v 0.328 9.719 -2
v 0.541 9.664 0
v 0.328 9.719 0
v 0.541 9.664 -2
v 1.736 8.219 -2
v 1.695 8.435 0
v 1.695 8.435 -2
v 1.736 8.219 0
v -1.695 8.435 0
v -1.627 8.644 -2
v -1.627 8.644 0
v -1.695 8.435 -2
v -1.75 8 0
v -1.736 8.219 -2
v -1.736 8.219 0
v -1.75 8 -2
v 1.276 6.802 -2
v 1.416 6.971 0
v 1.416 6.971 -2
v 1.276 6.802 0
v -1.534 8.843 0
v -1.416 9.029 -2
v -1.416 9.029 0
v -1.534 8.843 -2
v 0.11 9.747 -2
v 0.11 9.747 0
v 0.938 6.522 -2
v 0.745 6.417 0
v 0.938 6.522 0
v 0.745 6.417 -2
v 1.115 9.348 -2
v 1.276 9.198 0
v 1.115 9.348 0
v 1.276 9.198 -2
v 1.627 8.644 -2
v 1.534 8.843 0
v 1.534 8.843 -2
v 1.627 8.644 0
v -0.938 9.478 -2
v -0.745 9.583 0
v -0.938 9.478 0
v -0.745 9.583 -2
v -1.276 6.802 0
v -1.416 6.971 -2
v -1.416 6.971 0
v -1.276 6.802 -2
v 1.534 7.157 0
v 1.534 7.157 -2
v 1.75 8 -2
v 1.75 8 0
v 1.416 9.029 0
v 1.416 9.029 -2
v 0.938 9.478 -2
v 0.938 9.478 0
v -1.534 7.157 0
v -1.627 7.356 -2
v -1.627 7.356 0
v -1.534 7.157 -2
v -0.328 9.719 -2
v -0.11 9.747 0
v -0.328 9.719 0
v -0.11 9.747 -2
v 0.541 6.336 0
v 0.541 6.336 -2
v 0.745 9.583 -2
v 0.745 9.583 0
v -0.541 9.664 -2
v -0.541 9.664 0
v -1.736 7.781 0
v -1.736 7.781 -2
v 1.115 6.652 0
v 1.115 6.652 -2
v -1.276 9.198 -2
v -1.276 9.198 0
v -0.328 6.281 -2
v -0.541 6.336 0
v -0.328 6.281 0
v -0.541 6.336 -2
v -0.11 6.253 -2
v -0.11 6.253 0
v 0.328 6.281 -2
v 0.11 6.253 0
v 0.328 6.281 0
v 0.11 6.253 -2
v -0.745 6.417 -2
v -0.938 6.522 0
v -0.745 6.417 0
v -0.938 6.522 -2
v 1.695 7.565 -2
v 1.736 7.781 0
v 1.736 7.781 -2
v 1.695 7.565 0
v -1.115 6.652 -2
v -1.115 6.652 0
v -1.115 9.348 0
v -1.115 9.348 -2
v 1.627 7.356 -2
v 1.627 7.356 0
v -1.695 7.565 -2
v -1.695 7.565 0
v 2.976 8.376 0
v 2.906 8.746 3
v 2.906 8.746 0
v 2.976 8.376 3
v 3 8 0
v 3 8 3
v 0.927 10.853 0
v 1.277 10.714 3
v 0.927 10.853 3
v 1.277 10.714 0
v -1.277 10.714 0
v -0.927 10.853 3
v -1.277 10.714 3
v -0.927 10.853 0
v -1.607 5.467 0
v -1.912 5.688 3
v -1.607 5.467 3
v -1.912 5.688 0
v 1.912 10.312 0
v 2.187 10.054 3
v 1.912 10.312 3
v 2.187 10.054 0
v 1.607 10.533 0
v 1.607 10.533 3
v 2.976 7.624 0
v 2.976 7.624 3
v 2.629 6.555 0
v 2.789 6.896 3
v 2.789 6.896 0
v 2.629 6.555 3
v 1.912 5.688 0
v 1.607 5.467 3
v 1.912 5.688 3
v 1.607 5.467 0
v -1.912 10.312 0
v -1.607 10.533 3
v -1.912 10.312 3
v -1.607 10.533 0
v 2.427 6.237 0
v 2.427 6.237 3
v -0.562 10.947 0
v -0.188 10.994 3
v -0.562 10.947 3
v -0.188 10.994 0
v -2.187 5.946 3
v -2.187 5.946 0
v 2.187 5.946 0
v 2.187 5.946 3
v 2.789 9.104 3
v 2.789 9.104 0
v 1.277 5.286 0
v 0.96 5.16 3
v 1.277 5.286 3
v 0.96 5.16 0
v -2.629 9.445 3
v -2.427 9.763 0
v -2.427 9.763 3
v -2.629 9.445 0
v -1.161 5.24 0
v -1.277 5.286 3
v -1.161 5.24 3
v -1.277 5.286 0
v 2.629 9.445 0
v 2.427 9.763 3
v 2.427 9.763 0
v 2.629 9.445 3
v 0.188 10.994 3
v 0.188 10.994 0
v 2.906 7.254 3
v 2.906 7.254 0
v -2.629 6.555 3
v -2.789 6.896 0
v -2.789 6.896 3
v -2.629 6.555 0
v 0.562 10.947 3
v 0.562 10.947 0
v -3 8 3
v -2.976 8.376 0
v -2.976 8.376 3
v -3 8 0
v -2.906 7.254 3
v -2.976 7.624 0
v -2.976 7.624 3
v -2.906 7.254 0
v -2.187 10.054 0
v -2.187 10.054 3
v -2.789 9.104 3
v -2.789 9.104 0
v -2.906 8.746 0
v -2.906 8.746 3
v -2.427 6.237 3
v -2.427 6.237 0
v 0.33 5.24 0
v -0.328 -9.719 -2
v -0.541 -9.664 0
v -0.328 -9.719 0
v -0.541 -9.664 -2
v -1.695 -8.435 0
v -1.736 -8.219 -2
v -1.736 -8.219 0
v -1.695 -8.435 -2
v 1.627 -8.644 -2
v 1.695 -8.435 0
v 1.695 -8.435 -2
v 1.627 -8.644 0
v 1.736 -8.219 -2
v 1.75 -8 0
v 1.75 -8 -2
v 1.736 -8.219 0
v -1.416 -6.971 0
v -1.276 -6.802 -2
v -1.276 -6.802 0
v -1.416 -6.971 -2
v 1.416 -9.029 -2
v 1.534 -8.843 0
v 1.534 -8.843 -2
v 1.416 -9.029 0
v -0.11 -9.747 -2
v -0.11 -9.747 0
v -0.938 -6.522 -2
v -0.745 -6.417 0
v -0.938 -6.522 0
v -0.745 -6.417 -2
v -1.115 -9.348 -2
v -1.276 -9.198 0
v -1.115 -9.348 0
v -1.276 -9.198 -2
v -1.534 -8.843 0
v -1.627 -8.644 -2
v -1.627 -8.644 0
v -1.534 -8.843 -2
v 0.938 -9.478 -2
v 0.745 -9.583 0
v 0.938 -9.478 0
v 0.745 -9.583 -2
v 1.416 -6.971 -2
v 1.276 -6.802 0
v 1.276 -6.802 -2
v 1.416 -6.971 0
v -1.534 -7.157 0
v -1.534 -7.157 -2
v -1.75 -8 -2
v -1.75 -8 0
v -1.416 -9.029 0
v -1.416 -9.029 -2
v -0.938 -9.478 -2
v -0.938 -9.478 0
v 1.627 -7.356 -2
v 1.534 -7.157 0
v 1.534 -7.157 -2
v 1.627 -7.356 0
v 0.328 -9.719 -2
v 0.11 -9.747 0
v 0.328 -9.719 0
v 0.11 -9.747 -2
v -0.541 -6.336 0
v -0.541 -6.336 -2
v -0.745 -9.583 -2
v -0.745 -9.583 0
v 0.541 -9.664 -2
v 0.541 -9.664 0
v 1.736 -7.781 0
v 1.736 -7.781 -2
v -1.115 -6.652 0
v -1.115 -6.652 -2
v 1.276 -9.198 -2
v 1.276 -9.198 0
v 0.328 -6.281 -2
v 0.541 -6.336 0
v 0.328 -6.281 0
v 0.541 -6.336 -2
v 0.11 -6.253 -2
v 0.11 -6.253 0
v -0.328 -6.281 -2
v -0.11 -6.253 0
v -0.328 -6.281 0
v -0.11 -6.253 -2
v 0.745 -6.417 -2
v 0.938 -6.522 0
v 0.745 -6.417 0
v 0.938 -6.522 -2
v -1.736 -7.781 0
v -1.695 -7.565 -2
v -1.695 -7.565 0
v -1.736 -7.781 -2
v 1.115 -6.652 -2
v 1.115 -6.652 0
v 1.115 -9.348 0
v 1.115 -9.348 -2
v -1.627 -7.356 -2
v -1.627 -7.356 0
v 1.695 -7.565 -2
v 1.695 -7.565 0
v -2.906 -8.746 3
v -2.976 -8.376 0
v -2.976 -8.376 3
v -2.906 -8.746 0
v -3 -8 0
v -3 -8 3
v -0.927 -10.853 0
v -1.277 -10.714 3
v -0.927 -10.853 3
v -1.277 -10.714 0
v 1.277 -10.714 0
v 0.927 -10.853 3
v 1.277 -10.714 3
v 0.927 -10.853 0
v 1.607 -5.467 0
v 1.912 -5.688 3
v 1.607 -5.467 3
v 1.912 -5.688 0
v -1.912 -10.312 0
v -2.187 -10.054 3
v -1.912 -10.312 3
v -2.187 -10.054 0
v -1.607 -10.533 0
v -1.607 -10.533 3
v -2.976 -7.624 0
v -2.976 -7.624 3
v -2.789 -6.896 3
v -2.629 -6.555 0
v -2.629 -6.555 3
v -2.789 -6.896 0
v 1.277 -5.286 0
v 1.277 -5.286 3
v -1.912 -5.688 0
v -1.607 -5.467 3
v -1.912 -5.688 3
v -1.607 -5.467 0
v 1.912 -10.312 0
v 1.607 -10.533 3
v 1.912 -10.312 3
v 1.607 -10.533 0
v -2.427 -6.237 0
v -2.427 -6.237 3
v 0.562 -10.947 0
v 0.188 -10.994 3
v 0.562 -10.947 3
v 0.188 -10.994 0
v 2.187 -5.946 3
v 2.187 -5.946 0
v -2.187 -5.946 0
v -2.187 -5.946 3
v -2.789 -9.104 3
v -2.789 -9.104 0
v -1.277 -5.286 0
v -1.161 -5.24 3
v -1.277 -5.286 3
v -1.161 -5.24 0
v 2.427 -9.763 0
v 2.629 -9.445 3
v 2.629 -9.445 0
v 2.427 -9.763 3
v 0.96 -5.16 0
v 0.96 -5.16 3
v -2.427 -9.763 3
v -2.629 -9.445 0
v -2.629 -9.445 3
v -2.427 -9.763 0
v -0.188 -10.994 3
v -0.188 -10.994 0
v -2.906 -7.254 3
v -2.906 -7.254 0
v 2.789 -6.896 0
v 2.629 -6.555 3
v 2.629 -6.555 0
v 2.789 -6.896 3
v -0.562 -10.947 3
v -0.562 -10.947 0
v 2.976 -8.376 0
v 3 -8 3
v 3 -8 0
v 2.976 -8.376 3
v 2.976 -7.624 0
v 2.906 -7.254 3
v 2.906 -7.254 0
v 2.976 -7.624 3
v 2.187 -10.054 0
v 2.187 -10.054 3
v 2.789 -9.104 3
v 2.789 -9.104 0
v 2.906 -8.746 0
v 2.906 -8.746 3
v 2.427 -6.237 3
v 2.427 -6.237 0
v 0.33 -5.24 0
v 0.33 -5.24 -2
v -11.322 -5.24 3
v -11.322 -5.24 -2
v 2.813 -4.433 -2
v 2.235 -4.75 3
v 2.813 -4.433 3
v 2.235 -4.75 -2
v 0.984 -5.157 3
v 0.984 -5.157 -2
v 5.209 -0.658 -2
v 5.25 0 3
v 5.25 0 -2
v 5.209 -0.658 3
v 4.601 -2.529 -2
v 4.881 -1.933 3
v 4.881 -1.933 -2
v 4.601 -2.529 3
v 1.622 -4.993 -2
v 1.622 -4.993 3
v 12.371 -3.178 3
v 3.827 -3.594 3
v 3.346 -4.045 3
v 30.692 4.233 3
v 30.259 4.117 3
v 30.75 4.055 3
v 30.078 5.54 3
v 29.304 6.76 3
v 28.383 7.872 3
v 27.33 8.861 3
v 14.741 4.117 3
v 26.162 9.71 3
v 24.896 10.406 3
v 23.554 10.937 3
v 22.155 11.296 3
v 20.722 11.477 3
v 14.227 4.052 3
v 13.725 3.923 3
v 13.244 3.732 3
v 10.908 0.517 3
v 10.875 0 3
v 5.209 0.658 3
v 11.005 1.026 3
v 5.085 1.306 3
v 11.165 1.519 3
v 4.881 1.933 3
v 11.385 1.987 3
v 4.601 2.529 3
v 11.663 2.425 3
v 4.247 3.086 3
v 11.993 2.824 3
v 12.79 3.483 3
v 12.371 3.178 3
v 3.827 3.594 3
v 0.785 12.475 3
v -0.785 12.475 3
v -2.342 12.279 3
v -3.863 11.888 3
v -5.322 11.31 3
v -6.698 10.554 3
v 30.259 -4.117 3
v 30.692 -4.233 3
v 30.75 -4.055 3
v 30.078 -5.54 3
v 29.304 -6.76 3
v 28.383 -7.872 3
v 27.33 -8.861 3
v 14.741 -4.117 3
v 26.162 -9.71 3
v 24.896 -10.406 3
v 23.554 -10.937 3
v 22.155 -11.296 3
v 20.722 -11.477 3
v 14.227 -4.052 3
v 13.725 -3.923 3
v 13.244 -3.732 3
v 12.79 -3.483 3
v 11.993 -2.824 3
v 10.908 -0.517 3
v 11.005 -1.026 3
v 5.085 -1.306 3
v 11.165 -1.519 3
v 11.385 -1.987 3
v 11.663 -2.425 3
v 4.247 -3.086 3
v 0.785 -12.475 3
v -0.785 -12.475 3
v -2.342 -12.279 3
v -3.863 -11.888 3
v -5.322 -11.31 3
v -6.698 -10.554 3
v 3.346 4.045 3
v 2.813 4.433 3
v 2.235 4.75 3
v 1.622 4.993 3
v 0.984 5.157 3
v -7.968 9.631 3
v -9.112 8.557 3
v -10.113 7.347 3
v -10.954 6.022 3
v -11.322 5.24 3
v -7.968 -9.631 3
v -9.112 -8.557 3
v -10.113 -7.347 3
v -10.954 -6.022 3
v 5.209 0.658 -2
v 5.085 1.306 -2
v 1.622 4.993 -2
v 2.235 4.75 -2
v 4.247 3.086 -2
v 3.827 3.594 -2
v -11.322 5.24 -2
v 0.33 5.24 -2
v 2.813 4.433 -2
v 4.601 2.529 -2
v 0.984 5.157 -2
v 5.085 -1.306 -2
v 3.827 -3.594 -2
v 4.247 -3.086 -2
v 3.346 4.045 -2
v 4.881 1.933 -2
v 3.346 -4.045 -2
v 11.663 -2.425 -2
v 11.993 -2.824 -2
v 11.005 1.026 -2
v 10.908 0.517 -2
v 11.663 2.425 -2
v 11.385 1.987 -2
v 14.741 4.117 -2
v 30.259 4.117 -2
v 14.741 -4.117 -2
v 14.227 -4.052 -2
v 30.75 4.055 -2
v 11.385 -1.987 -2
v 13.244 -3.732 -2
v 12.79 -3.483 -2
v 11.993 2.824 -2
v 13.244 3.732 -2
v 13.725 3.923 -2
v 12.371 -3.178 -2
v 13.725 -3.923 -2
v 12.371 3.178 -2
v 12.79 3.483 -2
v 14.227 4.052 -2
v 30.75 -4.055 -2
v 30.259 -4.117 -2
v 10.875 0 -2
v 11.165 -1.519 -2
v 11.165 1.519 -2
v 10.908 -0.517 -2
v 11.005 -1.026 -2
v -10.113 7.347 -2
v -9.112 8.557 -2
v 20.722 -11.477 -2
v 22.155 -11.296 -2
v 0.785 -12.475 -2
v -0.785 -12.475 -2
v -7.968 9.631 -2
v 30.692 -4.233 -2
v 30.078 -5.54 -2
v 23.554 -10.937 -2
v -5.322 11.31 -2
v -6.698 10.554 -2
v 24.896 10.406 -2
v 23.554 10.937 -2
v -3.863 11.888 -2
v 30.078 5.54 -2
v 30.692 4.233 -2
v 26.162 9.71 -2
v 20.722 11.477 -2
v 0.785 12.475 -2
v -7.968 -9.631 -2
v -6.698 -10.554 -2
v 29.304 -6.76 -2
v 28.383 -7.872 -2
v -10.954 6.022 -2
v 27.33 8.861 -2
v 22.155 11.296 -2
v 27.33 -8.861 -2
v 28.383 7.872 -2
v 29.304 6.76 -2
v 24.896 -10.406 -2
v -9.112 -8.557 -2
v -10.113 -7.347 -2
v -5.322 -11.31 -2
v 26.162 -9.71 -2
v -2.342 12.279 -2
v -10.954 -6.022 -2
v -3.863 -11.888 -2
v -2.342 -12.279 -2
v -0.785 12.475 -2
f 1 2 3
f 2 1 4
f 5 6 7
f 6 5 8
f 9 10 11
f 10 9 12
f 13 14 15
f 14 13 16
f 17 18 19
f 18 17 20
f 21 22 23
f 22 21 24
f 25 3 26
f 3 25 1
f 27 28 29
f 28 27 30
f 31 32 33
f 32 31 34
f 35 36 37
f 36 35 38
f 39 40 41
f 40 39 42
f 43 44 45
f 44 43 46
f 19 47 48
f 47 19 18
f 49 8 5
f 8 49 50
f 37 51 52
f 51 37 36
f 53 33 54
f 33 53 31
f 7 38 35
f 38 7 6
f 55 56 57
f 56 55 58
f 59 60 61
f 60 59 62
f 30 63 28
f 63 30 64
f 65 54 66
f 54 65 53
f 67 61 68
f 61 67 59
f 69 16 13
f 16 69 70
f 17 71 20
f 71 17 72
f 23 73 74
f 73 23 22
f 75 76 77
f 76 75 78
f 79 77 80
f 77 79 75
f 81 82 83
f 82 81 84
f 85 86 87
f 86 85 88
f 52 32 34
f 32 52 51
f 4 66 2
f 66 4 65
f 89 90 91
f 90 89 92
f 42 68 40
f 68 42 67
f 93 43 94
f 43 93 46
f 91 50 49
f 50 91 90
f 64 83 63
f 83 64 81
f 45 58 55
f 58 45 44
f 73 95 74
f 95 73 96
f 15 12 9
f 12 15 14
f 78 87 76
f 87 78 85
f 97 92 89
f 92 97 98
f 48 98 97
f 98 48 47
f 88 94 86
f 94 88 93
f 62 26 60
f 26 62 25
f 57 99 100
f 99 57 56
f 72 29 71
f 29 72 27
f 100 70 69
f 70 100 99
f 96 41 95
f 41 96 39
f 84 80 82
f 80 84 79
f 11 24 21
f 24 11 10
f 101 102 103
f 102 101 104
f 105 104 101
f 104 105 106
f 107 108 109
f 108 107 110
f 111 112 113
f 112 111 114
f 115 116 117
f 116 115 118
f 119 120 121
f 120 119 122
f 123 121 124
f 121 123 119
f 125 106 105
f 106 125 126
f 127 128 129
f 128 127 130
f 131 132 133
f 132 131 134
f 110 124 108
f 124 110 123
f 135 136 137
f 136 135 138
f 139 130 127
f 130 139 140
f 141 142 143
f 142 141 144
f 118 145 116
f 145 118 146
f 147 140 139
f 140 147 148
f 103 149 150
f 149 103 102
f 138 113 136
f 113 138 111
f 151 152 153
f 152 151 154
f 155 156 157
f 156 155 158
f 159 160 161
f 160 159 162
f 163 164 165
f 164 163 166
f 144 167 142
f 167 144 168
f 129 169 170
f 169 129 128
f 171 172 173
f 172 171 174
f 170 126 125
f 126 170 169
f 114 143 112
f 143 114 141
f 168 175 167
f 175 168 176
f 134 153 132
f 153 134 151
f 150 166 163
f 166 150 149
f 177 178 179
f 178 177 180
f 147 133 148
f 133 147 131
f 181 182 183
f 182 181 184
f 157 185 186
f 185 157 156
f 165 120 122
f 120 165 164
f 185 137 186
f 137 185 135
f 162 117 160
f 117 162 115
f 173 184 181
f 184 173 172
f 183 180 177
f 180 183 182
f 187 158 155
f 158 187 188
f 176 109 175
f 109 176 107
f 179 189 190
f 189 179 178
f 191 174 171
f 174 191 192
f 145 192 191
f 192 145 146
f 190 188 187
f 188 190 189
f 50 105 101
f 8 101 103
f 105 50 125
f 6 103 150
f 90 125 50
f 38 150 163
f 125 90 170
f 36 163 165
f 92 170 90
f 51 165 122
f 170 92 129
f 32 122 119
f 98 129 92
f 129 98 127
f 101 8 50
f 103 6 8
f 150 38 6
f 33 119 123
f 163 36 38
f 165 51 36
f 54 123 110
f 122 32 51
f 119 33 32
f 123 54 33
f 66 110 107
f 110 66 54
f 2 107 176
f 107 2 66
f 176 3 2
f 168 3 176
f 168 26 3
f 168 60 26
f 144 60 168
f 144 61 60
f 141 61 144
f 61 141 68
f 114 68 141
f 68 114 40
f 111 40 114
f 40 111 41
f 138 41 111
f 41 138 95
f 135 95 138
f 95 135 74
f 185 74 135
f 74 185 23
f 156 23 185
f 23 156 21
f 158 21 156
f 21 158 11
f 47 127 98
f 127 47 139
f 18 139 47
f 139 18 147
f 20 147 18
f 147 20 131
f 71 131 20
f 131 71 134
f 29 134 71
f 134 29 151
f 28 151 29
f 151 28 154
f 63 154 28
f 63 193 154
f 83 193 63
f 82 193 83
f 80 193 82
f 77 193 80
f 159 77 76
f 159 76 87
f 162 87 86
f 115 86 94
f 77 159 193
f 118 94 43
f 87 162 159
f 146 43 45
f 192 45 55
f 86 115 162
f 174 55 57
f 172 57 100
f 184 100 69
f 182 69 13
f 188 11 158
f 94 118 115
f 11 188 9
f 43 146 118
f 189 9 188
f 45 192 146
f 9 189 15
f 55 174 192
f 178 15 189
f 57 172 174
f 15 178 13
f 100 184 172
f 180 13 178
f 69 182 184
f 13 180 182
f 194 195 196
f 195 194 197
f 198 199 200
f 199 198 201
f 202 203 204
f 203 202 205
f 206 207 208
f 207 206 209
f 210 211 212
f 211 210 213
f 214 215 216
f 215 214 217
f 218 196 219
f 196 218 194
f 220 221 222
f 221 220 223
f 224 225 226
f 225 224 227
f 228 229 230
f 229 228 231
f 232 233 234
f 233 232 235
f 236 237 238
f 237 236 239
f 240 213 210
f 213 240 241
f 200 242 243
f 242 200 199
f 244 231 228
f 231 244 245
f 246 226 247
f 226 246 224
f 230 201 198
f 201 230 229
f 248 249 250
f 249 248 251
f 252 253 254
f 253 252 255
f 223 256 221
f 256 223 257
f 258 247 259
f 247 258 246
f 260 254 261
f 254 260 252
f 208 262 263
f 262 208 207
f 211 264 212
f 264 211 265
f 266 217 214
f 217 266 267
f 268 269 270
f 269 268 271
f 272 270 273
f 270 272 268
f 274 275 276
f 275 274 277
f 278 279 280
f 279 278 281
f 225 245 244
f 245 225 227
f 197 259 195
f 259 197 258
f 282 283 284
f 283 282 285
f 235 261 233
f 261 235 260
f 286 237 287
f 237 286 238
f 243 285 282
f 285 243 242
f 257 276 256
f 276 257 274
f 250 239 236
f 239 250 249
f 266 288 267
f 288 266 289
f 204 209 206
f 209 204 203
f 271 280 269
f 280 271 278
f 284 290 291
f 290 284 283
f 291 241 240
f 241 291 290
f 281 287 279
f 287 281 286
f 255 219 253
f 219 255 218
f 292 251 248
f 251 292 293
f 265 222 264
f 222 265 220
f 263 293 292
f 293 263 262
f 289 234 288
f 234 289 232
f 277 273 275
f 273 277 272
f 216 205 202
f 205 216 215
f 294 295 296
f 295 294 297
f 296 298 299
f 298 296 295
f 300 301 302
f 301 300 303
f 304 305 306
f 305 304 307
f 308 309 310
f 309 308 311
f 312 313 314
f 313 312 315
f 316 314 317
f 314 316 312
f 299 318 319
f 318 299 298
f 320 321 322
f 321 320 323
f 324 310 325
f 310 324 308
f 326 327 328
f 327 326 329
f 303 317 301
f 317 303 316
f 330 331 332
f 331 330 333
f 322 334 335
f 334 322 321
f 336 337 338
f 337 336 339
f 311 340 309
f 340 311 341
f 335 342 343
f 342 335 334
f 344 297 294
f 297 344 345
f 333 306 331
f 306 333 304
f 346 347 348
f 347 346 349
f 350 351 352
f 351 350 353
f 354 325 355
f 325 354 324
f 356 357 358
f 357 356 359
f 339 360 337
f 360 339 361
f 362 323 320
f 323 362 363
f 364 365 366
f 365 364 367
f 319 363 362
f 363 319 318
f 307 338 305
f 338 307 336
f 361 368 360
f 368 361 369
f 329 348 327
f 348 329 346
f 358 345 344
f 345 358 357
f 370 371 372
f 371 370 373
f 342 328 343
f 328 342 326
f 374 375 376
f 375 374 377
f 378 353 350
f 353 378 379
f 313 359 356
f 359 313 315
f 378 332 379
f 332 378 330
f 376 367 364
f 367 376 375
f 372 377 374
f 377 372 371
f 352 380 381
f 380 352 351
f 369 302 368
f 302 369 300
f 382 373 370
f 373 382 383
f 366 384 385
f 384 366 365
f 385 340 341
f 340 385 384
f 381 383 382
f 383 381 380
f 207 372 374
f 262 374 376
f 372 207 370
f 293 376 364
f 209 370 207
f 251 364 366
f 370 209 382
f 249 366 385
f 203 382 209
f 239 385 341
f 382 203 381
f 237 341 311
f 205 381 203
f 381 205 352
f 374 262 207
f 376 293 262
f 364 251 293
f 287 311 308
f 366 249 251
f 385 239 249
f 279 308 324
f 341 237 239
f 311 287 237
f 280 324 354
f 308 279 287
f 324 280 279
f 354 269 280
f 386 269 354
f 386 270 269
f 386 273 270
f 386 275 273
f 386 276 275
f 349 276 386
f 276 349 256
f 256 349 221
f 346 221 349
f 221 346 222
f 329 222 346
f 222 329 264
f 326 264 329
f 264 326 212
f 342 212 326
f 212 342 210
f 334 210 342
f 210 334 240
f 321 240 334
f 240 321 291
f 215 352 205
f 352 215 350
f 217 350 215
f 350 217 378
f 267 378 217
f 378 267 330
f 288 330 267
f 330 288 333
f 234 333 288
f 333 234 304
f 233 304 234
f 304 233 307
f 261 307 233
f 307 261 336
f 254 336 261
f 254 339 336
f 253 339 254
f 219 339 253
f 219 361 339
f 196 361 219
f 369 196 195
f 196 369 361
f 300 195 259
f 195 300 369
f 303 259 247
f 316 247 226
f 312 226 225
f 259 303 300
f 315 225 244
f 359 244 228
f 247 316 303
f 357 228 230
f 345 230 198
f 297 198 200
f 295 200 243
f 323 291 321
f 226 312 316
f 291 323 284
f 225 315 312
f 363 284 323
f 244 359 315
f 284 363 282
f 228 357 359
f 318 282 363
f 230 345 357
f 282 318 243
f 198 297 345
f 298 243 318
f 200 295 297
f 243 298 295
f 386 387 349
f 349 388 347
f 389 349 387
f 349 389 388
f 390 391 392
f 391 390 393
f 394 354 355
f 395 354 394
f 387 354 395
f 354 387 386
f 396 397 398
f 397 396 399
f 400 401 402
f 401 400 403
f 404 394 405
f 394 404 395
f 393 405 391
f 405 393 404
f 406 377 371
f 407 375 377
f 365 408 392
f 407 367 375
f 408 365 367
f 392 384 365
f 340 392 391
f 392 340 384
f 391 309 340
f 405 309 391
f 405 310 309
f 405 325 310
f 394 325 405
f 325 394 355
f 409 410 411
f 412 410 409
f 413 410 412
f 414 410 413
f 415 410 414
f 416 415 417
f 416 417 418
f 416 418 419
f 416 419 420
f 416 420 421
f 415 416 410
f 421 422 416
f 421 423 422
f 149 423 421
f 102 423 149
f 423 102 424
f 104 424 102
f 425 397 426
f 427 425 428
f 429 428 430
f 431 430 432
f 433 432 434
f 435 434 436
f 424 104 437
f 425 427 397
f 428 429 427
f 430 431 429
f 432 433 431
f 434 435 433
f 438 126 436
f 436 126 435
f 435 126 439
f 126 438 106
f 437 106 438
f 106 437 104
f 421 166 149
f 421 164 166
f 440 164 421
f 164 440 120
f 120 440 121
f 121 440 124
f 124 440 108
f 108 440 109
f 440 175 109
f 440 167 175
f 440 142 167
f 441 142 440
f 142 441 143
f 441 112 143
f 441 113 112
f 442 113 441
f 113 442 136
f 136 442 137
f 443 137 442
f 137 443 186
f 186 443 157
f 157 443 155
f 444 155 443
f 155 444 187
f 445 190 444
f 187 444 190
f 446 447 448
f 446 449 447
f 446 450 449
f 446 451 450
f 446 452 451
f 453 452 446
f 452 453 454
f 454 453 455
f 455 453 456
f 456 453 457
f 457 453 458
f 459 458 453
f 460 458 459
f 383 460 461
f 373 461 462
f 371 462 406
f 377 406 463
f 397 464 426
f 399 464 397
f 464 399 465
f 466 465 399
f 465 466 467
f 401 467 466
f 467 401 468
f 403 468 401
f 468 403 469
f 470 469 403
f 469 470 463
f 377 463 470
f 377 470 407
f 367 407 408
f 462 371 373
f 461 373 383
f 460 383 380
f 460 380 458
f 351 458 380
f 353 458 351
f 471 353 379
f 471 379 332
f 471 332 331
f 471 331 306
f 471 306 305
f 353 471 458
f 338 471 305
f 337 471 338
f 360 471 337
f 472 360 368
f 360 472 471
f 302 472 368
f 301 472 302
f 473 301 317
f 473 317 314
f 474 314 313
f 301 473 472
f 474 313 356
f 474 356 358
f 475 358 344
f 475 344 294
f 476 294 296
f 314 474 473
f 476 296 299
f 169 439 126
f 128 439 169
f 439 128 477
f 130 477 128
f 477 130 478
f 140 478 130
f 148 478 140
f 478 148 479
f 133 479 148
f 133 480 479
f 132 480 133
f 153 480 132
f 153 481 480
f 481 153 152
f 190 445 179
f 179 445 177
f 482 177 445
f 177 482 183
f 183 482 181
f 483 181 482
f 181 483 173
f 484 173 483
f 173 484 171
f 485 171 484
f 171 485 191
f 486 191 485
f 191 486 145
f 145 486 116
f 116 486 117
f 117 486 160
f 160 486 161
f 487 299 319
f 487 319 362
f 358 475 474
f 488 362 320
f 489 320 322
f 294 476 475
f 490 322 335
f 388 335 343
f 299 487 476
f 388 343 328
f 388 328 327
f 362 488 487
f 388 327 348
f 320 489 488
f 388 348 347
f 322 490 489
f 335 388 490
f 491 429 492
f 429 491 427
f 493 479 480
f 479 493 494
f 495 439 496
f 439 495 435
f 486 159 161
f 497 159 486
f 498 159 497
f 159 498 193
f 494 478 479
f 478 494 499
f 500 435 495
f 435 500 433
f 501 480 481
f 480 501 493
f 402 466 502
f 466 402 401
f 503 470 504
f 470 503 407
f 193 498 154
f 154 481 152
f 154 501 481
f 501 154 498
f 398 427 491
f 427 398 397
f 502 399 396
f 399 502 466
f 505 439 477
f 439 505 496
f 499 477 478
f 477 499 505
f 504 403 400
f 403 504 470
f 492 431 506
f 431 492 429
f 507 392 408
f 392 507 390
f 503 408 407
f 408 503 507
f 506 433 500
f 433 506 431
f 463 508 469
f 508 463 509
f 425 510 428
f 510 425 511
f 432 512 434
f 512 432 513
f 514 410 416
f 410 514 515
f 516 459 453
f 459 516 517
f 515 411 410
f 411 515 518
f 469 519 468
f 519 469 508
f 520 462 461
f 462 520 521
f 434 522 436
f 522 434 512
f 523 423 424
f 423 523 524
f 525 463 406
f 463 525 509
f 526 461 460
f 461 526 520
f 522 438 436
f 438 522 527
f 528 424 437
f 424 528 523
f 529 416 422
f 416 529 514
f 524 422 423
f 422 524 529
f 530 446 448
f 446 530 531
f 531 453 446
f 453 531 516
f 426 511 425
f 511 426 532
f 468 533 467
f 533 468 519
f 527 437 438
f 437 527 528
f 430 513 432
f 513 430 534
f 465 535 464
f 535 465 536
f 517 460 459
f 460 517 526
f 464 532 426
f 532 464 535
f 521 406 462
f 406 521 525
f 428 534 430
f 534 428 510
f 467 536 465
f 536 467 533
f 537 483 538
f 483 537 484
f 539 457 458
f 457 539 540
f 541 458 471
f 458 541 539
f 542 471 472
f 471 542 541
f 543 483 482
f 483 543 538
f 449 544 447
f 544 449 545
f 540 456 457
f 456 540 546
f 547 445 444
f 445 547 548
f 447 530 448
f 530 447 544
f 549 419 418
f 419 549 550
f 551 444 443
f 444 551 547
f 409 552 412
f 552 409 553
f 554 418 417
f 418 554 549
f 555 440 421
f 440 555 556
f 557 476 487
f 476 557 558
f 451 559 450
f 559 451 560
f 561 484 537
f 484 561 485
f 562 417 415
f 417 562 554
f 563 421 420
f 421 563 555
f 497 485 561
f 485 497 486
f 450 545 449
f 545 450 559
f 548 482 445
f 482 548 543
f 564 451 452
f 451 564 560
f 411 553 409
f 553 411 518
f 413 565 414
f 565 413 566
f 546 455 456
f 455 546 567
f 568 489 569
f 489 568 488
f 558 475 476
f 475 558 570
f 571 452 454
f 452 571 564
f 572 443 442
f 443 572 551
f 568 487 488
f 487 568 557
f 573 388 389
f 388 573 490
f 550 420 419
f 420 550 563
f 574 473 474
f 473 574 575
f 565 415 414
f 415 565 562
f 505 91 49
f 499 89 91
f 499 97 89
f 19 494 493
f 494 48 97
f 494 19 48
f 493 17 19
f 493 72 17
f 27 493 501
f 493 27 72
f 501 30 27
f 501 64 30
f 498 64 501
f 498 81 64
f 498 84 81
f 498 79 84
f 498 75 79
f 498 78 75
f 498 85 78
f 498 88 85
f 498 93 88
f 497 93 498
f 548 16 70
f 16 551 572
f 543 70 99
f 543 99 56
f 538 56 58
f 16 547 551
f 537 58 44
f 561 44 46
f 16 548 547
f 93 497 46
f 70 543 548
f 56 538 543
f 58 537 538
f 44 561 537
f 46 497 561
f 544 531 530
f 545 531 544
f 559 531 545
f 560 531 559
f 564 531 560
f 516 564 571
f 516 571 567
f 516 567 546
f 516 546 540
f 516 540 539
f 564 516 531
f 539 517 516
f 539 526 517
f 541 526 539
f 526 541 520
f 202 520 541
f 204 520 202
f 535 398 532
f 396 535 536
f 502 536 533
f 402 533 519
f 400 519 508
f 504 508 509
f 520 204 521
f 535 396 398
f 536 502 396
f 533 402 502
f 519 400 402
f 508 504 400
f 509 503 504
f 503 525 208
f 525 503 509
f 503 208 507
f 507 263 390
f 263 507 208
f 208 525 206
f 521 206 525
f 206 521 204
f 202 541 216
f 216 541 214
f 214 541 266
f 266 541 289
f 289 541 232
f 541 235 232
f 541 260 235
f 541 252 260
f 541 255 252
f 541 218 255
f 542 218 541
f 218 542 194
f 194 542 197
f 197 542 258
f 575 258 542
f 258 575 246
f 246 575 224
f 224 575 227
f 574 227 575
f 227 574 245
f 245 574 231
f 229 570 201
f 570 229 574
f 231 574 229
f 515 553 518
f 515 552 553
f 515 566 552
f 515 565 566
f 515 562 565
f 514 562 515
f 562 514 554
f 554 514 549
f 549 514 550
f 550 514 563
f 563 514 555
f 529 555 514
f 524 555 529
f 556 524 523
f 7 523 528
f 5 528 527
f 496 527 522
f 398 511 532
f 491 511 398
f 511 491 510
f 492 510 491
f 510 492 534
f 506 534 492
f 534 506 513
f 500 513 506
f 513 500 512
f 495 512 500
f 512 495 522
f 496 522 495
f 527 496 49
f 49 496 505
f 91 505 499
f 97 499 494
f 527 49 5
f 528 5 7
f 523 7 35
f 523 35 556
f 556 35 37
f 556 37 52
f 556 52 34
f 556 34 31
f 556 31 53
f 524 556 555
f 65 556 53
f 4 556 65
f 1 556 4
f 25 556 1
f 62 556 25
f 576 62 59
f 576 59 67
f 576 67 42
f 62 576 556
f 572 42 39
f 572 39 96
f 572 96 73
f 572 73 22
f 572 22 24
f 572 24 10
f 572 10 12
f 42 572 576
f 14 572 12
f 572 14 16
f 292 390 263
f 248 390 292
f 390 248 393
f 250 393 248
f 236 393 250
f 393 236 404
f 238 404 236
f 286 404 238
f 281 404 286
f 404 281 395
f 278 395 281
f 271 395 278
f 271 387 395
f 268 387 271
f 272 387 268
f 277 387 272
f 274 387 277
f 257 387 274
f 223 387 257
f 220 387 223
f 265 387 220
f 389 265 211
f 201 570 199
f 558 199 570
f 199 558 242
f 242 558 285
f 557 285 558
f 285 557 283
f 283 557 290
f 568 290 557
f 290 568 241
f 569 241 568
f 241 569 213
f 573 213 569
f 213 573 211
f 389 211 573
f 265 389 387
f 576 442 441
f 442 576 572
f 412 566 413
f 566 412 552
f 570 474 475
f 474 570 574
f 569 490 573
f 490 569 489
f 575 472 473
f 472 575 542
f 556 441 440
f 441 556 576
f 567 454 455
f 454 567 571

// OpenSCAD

screw_len=6; //total threaded length
minus=4;
$fn=50;

//color([0.6,0.2,0.3])import("anti-z-wobbling.stl");

difference(){
hull()
{
cylinder(d=25,3);
translate([20,0,0])cylinder(d=23,3);
translate([0,0,-screw_len+minus])cylinder(d=25,screw_len-minus);
translate([20,0,-screw_len+minus])cylinder(d=23,screw_len-minus);
}

for(i=[0:1]){
rotate(i*-360/2){translate([0,8,-screw_len-1])cylinder(d=3.5,screw_len+5);
translate([0,8,0])cylinder(d=6,4);
   }
   }

translate([0,0,-screw_len-3]){
hull(){
cylinder(d=10.5,screw_len*2);
translate([-13,0,0])cylinder(d=10.5,screw_len*2);
}
hull(){
translate([15,0,0])cylinder(d=8.25,screw_len*2);
translate([30,0,0])cylinder(d=8.25,screw_len*2);
}
}
}
